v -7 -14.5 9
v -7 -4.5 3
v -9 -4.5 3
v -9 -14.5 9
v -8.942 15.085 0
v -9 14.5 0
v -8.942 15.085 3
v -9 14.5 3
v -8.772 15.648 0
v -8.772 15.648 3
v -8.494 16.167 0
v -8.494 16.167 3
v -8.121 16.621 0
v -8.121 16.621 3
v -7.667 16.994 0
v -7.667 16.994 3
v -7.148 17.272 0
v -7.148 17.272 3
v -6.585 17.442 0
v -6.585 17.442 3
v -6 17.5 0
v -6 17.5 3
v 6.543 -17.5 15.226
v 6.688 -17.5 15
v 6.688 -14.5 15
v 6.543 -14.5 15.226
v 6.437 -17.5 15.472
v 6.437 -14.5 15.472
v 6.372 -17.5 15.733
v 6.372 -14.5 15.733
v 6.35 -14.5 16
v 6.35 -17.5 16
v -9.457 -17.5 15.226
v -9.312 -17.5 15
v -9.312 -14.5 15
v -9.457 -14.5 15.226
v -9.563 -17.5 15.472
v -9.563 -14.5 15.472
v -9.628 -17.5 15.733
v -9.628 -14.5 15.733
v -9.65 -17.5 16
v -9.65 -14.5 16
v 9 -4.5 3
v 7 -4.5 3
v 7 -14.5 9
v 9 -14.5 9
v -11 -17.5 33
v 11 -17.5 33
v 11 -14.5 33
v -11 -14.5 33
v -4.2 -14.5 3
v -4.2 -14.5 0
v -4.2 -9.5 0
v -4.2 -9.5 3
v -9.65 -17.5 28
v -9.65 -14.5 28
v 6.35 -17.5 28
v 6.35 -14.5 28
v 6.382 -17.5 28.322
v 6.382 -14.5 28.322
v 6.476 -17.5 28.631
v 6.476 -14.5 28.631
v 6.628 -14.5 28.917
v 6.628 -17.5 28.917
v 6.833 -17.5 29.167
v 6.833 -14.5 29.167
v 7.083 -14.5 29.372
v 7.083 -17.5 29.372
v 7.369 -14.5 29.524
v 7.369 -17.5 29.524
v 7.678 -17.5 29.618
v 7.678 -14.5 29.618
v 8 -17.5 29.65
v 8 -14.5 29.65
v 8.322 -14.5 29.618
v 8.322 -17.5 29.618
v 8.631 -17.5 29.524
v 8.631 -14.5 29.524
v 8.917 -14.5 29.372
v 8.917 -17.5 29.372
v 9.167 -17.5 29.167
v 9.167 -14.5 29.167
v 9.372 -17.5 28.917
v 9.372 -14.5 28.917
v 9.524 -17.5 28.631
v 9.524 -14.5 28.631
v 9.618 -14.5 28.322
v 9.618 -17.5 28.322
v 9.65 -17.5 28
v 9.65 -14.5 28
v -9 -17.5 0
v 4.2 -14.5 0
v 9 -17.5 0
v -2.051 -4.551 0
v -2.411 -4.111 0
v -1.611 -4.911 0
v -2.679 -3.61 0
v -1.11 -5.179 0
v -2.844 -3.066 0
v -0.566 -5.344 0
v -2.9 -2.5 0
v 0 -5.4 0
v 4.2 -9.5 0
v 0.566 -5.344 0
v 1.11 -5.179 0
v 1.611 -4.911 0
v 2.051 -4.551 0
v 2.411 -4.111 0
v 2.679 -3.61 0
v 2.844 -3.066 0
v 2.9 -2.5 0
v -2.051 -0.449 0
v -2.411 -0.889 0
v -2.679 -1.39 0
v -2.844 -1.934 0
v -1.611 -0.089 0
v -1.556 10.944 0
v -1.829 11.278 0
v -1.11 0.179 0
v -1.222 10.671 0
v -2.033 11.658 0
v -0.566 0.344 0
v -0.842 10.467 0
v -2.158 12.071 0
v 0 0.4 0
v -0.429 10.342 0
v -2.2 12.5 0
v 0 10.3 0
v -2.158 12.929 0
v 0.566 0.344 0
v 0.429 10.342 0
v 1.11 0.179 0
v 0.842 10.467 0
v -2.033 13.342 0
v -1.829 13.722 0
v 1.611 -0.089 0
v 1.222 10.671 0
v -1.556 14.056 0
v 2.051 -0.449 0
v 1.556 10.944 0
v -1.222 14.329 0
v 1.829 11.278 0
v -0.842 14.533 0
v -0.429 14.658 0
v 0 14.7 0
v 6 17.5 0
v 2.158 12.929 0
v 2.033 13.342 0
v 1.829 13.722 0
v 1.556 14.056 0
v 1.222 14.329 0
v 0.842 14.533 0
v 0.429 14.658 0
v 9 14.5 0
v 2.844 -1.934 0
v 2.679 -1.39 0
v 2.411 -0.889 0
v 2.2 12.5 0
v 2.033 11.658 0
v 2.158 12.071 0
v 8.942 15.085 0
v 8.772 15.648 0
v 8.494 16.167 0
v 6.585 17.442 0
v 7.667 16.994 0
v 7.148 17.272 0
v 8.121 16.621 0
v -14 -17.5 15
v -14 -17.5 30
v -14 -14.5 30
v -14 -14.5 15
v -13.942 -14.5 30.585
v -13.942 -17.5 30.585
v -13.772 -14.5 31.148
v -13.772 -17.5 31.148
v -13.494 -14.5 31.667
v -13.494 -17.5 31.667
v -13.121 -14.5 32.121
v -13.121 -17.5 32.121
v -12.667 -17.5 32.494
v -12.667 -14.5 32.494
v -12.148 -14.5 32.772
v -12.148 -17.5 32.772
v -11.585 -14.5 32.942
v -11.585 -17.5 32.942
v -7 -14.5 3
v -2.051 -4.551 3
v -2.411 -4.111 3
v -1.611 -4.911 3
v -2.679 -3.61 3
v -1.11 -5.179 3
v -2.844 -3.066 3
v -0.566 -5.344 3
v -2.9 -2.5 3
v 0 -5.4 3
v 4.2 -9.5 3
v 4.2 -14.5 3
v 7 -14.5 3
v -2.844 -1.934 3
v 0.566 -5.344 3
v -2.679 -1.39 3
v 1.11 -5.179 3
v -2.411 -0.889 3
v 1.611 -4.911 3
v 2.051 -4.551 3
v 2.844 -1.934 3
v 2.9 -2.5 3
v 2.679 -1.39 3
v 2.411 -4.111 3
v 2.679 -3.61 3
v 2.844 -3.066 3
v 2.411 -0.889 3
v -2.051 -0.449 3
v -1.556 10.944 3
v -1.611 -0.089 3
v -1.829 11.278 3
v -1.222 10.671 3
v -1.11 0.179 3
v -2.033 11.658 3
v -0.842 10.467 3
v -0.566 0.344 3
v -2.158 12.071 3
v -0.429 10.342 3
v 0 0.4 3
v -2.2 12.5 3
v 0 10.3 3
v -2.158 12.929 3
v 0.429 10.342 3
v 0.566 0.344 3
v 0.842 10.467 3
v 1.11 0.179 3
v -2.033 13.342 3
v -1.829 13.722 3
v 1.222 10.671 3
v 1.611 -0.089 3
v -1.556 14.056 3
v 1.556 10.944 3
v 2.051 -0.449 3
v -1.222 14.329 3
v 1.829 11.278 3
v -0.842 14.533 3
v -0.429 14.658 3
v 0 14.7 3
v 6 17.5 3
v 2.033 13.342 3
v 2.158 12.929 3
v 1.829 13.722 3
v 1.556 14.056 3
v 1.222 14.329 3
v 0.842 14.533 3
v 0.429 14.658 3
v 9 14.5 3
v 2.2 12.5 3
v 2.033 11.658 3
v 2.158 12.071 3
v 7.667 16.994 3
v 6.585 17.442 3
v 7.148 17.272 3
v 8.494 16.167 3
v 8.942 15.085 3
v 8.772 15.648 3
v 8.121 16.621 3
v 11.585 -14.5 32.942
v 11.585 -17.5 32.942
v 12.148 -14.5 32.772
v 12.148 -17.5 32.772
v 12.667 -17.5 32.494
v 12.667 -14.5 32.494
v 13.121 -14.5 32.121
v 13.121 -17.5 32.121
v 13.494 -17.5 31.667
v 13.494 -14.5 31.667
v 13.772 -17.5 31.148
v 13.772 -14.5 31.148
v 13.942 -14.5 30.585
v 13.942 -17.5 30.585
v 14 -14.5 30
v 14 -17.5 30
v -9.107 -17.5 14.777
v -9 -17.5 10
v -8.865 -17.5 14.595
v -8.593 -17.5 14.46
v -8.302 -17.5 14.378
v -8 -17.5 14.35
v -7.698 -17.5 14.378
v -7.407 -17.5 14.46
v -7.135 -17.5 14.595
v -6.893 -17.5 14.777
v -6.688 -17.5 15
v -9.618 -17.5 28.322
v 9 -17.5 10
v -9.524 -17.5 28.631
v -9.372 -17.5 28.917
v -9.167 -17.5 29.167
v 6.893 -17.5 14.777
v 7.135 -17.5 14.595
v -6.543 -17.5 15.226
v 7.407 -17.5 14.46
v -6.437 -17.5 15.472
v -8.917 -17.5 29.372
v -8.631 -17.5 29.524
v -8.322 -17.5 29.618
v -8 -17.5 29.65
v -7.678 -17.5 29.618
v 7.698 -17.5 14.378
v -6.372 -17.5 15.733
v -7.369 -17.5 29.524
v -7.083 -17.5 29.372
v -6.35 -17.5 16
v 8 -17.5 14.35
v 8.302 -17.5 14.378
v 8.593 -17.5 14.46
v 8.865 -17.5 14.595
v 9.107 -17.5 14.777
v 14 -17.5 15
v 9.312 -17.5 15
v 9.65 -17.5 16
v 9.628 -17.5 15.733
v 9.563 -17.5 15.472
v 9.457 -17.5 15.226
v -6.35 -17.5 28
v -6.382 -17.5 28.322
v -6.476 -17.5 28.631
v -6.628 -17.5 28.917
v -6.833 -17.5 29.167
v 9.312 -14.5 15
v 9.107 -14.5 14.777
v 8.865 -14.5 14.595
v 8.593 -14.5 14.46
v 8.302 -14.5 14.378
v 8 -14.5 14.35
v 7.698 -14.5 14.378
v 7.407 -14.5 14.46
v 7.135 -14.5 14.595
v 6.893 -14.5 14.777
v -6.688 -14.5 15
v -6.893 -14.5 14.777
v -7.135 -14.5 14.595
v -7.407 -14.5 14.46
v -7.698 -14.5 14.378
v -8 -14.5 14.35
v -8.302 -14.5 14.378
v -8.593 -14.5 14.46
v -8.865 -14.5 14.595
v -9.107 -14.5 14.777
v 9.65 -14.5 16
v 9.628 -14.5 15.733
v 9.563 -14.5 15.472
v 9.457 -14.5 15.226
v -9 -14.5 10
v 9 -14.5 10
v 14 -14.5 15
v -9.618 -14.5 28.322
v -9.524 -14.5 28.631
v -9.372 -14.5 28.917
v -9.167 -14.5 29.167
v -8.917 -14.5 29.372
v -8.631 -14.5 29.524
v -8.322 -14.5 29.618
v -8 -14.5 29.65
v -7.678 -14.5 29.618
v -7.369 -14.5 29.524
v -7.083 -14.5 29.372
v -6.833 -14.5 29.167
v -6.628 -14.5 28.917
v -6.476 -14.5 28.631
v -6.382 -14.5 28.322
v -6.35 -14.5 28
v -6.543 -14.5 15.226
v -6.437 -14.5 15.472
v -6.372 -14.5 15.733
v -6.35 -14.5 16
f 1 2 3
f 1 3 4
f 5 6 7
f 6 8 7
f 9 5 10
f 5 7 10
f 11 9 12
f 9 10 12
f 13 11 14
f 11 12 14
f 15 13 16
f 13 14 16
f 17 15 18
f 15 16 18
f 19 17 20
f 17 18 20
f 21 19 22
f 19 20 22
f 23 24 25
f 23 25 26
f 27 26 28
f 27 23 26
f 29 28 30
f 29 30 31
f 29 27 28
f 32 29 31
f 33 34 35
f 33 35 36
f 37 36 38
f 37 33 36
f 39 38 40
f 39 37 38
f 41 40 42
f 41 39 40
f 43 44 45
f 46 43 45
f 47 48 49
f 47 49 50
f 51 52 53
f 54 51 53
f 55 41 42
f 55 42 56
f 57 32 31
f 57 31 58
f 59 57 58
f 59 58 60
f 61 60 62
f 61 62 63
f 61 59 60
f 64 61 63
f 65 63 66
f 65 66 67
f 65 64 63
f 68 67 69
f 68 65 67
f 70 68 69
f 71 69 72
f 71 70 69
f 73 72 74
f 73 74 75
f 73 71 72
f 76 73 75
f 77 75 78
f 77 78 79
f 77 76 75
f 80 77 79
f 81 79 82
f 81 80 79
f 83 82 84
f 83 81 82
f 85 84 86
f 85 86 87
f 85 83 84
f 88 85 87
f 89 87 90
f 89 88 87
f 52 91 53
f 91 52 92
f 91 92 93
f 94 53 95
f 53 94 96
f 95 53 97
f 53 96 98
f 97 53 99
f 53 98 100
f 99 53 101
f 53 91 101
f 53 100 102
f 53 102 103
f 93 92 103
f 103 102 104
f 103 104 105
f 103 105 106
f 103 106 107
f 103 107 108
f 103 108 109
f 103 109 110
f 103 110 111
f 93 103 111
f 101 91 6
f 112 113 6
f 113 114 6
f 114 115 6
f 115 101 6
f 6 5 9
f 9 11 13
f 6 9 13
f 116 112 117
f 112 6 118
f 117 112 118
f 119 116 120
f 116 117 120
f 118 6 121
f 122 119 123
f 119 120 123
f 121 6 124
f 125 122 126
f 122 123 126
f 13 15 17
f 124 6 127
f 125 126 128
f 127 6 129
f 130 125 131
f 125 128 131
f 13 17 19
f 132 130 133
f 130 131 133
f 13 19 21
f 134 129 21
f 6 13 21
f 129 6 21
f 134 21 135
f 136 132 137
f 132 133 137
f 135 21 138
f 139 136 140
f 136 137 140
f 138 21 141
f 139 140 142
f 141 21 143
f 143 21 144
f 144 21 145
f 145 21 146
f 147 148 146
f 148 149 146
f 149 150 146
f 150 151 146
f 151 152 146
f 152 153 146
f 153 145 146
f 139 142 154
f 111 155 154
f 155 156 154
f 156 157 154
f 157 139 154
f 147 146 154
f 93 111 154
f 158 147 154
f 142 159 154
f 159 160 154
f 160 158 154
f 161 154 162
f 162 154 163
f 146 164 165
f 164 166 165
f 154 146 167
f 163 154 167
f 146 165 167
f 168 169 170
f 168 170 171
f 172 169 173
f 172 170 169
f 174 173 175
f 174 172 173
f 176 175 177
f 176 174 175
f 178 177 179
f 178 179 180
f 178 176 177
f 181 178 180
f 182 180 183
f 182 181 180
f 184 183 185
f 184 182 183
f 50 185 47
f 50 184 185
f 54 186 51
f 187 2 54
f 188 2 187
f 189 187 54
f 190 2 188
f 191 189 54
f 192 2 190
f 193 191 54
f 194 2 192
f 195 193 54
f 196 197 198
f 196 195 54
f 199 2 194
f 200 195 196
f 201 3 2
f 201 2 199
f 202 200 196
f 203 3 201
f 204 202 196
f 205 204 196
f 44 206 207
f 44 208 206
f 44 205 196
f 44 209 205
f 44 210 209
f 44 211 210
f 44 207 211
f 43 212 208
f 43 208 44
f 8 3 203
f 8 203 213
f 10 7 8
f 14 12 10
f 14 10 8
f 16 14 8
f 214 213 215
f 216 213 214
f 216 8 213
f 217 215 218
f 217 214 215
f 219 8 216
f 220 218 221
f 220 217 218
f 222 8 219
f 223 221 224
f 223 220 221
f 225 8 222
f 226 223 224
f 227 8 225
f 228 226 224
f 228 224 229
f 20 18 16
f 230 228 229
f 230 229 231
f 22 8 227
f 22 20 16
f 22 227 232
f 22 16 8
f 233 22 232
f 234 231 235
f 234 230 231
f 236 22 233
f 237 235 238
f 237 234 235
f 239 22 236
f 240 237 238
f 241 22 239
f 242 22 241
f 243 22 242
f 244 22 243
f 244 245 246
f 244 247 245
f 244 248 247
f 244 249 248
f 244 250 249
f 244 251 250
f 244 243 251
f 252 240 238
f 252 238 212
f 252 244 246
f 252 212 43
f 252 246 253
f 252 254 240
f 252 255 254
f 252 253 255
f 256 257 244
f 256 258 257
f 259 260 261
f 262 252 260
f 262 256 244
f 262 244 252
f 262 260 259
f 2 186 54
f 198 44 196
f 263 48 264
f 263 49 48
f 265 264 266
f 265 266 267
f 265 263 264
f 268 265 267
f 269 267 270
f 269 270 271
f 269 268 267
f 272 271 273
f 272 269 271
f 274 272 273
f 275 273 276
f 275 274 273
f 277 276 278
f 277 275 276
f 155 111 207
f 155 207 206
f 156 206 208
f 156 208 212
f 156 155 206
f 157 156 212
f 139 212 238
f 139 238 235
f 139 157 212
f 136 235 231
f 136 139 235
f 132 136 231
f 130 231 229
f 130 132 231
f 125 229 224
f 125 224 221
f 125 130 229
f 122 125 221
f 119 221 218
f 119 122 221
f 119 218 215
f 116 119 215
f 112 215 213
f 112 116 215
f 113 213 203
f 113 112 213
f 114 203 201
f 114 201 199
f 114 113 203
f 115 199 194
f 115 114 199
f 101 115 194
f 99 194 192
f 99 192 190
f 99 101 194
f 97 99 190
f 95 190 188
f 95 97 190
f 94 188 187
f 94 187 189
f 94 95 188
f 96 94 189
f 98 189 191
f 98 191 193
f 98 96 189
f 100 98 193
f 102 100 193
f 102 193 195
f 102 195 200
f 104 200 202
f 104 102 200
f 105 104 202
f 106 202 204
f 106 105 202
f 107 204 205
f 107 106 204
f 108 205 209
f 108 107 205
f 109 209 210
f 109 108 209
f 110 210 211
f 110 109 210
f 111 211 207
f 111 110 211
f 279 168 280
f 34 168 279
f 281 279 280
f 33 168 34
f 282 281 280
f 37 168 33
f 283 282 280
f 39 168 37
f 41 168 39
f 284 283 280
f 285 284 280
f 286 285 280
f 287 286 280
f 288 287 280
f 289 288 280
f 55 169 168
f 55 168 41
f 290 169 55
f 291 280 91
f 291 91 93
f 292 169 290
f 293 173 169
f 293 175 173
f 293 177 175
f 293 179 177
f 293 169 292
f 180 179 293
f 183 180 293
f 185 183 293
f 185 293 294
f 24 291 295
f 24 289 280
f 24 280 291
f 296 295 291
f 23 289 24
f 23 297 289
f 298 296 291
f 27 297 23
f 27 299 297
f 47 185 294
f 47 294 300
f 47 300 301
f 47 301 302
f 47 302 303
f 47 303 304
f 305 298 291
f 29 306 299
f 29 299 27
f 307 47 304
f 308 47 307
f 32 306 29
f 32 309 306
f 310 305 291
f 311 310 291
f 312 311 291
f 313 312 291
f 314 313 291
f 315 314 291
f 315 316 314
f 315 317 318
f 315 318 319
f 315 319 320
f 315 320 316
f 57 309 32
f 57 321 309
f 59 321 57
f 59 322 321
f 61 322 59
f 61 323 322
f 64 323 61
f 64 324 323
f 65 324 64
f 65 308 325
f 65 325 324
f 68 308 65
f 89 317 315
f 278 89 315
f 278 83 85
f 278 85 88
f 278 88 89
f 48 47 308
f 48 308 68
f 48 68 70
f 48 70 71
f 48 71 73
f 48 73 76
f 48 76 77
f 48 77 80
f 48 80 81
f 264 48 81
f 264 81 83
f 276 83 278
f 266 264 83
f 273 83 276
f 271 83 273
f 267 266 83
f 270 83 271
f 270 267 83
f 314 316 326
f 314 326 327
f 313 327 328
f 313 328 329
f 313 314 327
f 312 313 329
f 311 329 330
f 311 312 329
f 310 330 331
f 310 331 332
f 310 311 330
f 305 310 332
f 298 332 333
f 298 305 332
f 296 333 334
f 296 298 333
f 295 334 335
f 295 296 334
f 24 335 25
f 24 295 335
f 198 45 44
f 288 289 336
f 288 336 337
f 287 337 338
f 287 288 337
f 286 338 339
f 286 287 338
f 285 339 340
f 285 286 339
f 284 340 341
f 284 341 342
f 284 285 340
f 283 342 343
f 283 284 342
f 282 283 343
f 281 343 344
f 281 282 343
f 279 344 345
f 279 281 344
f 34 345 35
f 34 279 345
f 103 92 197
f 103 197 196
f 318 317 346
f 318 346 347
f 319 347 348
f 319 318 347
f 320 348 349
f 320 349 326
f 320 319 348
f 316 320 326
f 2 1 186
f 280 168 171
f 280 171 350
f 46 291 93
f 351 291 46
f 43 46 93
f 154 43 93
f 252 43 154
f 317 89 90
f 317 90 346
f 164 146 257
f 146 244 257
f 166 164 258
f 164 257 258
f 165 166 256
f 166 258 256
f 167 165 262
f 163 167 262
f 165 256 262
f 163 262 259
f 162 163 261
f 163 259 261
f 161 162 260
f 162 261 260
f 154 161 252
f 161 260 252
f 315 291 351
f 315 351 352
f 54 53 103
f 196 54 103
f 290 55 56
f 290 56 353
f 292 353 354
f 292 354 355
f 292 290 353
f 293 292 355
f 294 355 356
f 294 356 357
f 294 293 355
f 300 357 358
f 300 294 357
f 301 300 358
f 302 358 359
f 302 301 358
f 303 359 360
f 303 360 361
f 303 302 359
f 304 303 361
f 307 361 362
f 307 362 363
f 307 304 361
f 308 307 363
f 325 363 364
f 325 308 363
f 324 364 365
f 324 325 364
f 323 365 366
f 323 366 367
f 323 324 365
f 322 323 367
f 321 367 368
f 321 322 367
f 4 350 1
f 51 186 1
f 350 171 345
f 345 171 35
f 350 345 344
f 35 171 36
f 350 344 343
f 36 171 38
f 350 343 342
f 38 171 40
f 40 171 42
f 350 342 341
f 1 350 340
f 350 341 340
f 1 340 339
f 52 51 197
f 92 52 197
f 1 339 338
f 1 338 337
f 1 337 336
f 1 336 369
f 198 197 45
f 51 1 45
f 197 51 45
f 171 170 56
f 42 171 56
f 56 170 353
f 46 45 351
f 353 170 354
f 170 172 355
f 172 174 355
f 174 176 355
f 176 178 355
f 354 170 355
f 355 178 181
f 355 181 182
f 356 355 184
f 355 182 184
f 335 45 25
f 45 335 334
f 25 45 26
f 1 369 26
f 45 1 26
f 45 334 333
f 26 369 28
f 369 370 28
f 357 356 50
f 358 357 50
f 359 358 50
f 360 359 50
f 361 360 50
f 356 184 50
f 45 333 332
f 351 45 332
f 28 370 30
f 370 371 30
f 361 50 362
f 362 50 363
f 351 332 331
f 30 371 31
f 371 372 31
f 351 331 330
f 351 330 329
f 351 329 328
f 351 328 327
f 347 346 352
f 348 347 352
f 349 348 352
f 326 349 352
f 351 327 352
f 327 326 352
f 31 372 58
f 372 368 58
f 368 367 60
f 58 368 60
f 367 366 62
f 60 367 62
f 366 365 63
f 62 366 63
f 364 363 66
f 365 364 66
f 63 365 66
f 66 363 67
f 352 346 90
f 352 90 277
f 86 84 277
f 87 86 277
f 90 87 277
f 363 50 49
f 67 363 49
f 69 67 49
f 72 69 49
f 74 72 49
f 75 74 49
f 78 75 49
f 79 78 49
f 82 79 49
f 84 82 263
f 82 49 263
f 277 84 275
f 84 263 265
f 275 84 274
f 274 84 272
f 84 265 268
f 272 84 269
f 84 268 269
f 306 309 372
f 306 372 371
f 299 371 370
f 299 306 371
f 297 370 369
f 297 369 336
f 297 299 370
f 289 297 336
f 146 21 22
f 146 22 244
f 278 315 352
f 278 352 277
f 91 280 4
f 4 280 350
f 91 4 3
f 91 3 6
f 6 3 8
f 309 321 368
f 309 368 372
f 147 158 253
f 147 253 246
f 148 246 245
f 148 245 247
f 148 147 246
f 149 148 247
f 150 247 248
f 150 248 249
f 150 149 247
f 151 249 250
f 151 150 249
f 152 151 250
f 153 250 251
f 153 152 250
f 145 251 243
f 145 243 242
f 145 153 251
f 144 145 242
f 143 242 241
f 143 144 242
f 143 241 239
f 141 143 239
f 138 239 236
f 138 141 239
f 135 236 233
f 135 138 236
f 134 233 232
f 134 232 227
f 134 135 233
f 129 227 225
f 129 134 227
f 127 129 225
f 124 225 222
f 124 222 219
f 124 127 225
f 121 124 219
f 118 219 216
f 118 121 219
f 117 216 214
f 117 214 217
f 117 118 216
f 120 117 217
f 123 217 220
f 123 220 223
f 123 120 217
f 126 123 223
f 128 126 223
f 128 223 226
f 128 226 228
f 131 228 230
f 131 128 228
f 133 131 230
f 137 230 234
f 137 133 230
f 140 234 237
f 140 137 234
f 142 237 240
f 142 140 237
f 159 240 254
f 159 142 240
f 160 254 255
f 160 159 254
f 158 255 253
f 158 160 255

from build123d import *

# Parameters (mm, degrees)
F0_W     = 18
F0_H     = 35
F0_W_2   = 8.4
F0_H_2   = 5
F0_R     = 2.9
F0_R_2   = 2.2
F1_DEPTH = 3
F2_W     = 18
F2_H     = 7
F3_DEPTH = 3
F5_START = 7
F5_DEPTH = 2
F6_START = -7
F6_DEPTH = 2
F7_R     = 3


with BuildPart() as f1:
    # F0 (on Top) → F1 (new body)
    with BuildSketch(Plane.XY):
        Rectangle(F0_W, F0_H)
        with Locations((0, -12)):
            Rectangle(F0_W_2, F0_H_2, mode=Mode.SUBTRACT)
        with Locations((0, -2.5)):
            Circle(F0_R, mode=Mode.SUBTRACT)
        with Locations((0, 12.5)):
            Circle(F0_R_2, mode=Mode.SUBTRACT)
    extrude(amount=F1_DEPTH)

    # F2 (on face) → F3 (join)
    with BuildSketch(Plane.XZ.offset(17.5)):
        with Locations((0, 6.5)):
            Rectangle(F2_W, F2_H)
        with BuildLine():
            Line((-14, 15), (-9, 10))
            Line((-9, 10), (9, 10))
            Line((9, 10), (14, 15))
            Line((14, 15), (9.3124404748, 15))
            ThreePointArc((9.3124404748, 15), (8, 14.35), (6.6875595252, 15))
            Line((6.6875595252, 15), (-6.6875595252, 15))
            ThreePointArc((-6.6875595252, 15), (-8, 14.35), (-9.3124404748, 15))
            Line((-9.3124404748, 15), (-14, 15))
        make_face()
        with BuildLine():
            Line((-14, 33), (-14, 15))
            Line((-14, 15), (-9.3124404748, 15))
            ThreePointArc((-9.3124404748, 15), (-9.5633340627, 15.4722816961), (-9.65, 16))
            Line((-9.65, 16), (-9.65, 28))
            ThreePointArc((-9.65, 28), (-8, 29.65), (-6.35, 28))
            Line((-6.35, 28), (-6.35, 16))
            ThreePointArc((-6.35, 16), (-6.4366659373, 15.4722816961), (-6.6875595252, 15))
            Line((-6.6875595252, 15), (6.6875595252, 15))
            ThreePointArc((6.6875595252, 15), (6.4366659373, 15.4722816961), (6.35, 16))
            Line((6.35, 16), (6.35, 28))
            ThreePointArc((6.35, 28), (8, 29.65), (9.65, 28))
            Line((9.65, 28), (9.65, 16))
            ThreePointArc((9.65, 16), (9.5633340627, 15.4722816961), (9.3124404748, 15))
            Line((9.3124404748, 15), (14, 15))
            Line((14, 15), (14, 33))
            Line((14, 33), (-14, 33))
        make_face()
    extrude(amount=-F3_DEPTH)

    # F4 (on Right) → F5 (join)
    with BuildSketch(Plane.YZ.offset(F5_START)):
        Polygon((-4.5, 3), (-14.5, 9), (-14.5, 3), align=None)
    extrude(amount=F5_DEPTH)

    # F4 (on Right) → F6 (join)
    with BuildSketch(Plane.YZ.offset(F6_START)):
        Polygon((-4.5, 3), (-14.5, 9), (-14.5, 3), align=None)
    extrude(amount=-F6_DEPTH)

    # F7
    f7_edges = [f1.edges().sort_by_distance(p)[0] for p in [
        (-14, -16, 33),
        (14, -16, 33),
        (9, 17.5, 1.5),
        (-9, 17.5, 1.5),
    ]]
    fillet(f7_edges, radius=F7_R)


solid = f1.part
